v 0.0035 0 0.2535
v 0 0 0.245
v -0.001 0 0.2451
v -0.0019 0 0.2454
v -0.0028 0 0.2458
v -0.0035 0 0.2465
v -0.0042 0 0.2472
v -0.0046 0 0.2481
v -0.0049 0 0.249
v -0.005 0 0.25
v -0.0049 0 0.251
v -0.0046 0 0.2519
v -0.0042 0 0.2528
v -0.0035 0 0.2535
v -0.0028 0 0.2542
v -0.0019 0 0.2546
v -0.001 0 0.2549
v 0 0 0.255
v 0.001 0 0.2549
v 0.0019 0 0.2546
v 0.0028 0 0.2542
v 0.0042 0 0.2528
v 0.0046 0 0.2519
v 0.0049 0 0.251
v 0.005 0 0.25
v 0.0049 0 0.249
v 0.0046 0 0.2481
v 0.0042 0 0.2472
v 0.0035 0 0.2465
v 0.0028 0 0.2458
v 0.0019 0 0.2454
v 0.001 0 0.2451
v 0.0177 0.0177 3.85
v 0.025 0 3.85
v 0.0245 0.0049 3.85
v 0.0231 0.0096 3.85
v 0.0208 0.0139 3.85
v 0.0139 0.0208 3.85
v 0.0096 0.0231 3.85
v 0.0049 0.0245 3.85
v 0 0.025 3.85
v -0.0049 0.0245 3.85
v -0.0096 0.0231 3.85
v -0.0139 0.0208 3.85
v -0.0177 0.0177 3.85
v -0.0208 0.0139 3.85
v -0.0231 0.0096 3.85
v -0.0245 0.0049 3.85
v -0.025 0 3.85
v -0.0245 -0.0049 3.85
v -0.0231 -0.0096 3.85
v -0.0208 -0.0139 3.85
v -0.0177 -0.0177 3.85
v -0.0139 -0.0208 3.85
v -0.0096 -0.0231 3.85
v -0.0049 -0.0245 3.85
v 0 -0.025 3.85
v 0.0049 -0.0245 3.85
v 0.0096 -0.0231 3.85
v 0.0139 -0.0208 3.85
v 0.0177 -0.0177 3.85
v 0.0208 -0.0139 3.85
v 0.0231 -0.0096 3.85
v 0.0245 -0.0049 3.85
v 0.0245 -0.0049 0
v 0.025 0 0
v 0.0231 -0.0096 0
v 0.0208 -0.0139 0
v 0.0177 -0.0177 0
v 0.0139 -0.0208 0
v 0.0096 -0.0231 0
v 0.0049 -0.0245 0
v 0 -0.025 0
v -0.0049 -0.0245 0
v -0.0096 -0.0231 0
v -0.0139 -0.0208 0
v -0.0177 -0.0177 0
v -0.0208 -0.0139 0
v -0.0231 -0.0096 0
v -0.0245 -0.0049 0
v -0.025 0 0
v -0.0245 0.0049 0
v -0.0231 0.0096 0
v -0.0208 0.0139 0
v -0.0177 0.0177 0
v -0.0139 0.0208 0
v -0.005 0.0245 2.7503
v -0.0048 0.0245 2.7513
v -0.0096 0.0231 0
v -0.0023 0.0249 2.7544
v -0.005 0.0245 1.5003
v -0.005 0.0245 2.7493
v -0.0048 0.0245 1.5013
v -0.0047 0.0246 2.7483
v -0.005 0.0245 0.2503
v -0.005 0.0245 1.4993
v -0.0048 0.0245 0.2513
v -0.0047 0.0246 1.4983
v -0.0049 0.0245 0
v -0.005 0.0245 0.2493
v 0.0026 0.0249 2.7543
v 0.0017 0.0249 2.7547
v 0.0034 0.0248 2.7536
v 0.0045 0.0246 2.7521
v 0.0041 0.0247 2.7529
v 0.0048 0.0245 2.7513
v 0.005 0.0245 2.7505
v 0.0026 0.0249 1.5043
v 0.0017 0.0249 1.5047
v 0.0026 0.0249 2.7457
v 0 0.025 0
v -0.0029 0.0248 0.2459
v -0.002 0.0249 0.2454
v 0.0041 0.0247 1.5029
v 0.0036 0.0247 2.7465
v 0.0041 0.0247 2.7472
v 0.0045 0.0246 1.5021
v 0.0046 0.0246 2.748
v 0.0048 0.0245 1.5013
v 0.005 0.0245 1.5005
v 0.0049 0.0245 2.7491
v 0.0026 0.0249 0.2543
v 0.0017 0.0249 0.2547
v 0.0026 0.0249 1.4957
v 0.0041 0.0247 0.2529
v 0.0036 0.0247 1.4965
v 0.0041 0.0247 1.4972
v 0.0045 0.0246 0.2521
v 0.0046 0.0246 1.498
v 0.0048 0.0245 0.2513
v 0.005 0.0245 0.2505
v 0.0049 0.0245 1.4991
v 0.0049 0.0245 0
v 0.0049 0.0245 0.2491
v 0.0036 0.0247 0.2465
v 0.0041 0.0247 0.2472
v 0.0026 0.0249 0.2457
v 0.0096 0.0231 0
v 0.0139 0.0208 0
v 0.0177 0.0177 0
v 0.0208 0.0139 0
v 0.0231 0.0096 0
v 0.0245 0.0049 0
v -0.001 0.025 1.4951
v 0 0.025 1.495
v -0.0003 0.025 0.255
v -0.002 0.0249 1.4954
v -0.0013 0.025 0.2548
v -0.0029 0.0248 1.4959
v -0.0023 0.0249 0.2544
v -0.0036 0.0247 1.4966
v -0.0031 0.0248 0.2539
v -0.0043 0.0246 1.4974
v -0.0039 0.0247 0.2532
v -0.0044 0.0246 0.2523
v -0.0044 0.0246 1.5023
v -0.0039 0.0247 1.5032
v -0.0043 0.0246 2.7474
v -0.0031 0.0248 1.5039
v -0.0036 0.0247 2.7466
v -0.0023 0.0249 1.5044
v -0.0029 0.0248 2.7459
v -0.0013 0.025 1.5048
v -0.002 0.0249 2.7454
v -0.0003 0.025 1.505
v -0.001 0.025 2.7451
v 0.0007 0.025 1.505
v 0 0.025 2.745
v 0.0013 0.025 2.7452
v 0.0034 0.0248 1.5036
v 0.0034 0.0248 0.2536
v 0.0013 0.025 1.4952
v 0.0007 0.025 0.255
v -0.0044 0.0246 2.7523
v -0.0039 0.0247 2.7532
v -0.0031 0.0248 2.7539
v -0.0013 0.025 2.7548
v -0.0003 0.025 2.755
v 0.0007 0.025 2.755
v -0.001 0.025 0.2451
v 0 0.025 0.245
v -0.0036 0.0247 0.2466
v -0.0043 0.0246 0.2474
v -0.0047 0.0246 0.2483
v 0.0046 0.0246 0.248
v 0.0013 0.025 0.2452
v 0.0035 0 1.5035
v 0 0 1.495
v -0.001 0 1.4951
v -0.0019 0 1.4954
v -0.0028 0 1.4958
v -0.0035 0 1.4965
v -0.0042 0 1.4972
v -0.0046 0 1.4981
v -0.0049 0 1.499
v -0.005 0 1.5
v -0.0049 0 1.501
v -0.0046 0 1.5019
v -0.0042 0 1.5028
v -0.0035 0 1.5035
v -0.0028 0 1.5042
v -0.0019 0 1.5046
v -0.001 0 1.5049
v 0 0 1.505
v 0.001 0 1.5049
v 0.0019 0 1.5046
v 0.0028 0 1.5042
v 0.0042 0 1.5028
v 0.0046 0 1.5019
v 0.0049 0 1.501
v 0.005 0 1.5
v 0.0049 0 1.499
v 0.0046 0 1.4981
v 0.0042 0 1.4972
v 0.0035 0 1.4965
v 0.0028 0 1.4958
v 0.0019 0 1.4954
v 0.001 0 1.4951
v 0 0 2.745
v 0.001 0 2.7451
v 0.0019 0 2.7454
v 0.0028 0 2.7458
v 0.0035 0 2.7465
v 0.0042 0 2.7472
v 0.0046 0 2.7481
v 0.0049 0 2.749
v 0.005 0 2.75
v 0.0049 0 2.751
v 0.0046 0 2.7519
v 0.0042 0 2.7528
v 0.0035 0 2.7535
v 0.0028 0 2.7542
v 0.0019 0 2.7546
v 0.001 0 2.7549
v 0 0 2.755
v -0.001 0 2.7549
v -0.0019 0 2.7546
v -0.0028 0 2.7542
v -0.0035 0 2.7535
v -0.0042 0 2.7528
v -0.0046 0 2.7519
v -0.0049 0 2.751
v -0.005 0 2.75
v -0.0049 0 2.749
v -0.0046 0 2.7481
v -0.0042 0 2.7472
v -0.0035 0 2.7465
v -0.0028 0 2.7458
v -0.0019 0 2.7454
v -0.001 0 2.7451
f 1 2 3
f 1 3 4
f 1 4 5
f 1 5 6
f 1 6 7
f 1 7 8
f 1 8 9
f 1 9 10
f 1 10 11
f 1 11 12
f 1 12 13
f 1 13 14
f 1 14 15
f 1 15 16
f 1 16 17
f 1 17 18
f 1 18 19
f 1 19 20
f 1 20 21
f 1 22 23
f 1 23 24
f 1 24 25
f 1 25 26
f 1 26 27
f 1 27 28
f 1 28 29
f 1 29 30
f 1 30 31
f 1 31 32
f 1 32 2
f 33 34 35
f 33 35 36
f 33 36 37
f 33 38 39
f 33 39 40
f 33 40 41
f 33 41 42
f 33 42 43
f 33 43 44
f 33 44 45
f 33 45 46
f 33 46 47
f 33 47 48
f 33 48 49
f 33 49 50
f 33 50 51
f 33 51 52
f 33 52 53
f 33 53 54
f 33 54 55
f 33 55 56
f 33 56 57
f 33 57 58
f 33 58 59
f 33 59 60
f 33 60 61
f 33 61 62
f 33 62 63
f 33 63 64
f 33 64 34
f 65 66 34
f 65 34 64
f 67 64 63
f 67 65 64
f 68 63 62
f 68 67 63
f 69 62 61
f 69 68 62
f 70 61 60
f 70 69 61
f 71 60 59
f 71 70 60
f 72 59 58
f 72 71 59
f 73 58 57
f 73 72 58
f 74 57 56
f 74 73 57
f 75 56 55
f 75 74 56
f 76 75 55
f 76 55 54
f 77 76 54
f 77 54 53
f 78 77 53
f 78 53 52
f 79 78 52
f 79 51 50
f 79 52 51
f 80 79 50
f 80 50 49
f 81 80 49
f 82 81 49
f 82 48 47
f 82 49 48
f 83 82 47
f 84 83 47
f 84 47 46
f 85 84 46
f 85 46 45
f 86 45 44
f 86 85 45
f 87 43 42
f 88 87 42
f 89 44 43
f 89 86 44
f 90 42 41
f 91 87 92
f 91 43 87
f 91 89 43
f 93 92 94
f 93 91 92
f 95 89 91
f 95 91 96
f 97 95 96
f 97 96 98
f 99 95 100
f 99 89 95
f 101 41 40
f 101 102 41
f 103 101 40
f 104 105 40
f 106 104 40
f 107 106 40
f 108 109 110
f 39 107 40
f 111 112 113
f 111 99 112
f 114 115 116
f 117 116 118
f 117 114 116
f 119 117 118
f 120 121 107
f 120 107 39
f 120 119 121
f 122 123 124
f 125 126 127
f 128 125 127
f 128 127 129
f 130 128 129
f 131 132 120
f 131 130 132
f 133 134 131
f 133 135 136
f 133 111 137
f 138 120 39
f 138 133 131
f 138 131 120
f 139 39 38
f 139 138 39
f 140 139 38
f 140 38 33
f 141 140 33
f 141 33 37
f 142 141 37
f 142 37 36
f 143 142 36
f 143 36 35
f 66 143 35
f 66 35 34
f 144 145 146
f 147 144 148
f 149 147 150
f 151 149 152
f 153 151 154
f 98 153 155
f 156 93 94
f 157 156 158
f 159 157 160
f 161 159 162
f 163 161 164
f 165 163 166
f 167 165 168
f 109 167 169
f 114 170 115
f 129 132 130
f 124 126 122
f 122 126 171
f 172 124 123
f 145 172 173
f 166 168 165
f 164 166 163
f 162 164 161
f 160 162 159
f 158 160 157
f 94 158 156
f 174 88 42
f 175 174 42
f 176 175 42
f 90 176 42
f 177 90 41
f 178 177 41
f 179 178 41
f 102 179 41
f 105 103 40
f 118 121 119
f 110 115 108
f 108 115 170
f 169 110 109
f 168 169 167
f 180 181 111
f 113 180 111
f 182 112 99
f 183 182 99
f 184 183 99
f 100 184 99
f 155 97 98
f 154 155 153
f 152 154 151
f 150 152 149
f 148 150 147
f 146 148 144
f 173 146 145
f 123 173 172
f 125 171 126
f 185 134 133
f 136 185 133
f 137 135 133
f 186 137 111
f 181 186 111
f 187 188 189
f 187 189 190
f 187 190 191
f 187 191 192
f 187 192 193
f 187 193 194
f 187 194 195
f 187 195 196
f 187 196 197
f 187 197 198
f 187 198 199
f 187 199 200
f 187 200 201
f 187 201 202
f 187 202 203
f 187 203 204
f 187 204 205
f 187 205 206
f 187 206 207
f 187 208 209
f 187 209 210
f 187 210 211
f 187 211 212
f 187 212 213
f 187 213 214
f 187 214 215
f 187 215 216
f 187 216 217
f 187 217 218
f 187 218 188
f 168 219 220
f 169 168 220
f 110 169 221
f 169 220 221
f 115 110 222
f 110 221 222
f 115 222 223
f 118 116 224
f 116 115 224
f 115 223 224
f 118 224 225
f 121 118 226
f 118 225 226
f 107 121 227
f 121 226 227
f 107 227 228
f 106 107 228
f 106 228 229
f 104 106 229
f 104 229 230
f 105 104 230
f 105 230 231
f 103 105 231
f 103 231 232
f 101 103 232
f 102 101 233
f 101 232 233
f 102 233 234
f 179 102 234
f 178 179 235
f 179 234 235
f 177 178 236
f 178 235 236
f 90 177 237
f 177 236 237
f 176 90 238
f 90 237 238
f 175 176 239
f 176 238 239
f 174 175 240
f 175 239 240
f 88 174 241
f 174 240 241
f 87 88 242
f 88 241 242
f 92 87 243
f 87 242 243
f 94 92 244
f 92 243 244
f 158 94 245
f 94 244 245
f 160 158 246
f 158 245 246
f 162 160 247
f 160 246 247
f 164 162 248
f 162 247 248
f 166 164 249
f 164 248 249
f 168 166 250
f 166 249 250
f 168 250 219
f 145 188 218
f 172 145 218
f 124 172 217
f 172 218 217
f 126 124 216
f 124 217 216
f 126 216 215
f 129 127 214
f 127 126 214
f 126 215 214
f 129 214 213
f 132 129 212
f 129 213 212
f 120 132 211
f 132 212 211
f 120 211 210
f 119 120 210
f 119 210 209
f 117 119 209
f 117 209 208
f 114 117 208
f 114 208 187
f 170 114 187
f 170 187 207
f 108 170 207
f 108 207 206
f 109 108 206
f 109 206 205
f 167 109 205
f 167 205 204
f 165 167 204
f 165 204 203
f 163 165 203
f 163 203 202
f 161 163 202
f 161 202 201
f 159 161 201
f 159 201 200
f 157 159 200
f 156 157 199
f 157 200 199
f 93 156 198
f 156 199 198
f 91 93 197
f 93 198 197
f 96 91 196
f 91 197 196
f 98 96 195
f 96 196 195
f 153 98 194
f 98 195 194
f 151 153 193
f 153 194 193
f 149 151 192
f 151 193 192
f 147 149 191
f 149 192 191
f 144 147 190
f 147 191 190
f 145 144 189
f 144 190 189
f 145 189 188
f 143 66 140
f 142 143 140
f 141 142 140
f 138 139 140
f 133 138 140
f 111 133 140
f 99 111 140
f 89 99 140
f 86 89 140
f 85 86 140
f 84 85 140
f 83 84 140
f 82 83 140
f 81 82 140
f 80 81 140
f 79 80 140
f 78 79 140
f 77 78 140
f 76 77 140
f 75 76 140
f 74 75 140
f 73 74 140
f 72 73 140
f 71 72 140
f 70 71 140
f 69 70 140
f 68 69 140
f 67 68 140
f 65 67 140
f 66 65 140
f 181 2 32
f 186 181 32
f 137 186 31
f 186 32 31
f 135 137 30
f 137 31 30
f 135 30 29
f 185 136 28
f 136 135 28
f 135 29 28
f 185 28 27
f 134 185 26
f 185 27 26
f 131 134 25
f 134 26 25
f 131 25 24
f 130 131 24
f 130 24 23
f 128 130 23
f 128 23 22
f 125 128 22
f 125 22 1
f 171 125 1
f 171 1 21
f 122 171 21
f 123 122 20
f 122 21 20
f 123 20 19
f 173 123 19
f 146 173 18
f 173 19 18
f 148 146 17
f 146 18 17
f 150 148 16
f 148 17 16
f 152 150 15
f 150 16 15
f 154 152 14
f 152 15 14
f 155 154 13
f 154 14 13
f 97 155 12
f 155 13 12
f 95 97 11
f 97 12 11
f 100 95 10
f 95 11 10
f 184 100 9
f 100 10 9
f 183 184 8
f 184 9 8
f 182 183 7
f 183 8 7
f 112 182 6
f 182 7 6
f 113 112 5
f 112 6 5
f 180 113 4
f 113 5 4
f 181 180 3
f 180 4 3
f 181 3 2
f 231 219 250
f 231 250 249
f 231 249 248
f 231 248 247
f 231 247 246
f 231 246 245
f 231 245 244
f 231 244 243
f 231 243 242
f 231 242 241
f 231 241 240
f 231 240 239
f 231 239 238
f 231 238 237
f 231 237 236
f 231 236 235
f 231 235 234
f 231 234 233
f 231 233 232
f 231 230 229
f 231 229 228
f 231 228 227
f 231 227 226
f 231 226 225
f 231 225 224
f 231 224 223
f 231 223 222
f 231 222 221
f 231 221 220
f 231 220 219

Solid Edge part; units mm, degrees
sketch "Sketch1" plane through (0, 0, 0) normal (0, 0, 1) x (1, 0, 0)
  circle A0 centre (0, 0) radius 0.025
  dimension "D1" = 0.05
extrude "Protrusion1" add sketch "Sketch1" along normal blind 3.85
hole "Bohrung_1" at (0, 0, 1.5) direction (0, 1, 0) diameter 0.01 end up to next
hole "Hole1" at (0, 0, 2.75) direction (0, 1, 0) diameter 0.01 end up to next
hole "Hole2" at (0, 0, 0.25) direction (0, 1, 0) diameter 0.01 end up to next
